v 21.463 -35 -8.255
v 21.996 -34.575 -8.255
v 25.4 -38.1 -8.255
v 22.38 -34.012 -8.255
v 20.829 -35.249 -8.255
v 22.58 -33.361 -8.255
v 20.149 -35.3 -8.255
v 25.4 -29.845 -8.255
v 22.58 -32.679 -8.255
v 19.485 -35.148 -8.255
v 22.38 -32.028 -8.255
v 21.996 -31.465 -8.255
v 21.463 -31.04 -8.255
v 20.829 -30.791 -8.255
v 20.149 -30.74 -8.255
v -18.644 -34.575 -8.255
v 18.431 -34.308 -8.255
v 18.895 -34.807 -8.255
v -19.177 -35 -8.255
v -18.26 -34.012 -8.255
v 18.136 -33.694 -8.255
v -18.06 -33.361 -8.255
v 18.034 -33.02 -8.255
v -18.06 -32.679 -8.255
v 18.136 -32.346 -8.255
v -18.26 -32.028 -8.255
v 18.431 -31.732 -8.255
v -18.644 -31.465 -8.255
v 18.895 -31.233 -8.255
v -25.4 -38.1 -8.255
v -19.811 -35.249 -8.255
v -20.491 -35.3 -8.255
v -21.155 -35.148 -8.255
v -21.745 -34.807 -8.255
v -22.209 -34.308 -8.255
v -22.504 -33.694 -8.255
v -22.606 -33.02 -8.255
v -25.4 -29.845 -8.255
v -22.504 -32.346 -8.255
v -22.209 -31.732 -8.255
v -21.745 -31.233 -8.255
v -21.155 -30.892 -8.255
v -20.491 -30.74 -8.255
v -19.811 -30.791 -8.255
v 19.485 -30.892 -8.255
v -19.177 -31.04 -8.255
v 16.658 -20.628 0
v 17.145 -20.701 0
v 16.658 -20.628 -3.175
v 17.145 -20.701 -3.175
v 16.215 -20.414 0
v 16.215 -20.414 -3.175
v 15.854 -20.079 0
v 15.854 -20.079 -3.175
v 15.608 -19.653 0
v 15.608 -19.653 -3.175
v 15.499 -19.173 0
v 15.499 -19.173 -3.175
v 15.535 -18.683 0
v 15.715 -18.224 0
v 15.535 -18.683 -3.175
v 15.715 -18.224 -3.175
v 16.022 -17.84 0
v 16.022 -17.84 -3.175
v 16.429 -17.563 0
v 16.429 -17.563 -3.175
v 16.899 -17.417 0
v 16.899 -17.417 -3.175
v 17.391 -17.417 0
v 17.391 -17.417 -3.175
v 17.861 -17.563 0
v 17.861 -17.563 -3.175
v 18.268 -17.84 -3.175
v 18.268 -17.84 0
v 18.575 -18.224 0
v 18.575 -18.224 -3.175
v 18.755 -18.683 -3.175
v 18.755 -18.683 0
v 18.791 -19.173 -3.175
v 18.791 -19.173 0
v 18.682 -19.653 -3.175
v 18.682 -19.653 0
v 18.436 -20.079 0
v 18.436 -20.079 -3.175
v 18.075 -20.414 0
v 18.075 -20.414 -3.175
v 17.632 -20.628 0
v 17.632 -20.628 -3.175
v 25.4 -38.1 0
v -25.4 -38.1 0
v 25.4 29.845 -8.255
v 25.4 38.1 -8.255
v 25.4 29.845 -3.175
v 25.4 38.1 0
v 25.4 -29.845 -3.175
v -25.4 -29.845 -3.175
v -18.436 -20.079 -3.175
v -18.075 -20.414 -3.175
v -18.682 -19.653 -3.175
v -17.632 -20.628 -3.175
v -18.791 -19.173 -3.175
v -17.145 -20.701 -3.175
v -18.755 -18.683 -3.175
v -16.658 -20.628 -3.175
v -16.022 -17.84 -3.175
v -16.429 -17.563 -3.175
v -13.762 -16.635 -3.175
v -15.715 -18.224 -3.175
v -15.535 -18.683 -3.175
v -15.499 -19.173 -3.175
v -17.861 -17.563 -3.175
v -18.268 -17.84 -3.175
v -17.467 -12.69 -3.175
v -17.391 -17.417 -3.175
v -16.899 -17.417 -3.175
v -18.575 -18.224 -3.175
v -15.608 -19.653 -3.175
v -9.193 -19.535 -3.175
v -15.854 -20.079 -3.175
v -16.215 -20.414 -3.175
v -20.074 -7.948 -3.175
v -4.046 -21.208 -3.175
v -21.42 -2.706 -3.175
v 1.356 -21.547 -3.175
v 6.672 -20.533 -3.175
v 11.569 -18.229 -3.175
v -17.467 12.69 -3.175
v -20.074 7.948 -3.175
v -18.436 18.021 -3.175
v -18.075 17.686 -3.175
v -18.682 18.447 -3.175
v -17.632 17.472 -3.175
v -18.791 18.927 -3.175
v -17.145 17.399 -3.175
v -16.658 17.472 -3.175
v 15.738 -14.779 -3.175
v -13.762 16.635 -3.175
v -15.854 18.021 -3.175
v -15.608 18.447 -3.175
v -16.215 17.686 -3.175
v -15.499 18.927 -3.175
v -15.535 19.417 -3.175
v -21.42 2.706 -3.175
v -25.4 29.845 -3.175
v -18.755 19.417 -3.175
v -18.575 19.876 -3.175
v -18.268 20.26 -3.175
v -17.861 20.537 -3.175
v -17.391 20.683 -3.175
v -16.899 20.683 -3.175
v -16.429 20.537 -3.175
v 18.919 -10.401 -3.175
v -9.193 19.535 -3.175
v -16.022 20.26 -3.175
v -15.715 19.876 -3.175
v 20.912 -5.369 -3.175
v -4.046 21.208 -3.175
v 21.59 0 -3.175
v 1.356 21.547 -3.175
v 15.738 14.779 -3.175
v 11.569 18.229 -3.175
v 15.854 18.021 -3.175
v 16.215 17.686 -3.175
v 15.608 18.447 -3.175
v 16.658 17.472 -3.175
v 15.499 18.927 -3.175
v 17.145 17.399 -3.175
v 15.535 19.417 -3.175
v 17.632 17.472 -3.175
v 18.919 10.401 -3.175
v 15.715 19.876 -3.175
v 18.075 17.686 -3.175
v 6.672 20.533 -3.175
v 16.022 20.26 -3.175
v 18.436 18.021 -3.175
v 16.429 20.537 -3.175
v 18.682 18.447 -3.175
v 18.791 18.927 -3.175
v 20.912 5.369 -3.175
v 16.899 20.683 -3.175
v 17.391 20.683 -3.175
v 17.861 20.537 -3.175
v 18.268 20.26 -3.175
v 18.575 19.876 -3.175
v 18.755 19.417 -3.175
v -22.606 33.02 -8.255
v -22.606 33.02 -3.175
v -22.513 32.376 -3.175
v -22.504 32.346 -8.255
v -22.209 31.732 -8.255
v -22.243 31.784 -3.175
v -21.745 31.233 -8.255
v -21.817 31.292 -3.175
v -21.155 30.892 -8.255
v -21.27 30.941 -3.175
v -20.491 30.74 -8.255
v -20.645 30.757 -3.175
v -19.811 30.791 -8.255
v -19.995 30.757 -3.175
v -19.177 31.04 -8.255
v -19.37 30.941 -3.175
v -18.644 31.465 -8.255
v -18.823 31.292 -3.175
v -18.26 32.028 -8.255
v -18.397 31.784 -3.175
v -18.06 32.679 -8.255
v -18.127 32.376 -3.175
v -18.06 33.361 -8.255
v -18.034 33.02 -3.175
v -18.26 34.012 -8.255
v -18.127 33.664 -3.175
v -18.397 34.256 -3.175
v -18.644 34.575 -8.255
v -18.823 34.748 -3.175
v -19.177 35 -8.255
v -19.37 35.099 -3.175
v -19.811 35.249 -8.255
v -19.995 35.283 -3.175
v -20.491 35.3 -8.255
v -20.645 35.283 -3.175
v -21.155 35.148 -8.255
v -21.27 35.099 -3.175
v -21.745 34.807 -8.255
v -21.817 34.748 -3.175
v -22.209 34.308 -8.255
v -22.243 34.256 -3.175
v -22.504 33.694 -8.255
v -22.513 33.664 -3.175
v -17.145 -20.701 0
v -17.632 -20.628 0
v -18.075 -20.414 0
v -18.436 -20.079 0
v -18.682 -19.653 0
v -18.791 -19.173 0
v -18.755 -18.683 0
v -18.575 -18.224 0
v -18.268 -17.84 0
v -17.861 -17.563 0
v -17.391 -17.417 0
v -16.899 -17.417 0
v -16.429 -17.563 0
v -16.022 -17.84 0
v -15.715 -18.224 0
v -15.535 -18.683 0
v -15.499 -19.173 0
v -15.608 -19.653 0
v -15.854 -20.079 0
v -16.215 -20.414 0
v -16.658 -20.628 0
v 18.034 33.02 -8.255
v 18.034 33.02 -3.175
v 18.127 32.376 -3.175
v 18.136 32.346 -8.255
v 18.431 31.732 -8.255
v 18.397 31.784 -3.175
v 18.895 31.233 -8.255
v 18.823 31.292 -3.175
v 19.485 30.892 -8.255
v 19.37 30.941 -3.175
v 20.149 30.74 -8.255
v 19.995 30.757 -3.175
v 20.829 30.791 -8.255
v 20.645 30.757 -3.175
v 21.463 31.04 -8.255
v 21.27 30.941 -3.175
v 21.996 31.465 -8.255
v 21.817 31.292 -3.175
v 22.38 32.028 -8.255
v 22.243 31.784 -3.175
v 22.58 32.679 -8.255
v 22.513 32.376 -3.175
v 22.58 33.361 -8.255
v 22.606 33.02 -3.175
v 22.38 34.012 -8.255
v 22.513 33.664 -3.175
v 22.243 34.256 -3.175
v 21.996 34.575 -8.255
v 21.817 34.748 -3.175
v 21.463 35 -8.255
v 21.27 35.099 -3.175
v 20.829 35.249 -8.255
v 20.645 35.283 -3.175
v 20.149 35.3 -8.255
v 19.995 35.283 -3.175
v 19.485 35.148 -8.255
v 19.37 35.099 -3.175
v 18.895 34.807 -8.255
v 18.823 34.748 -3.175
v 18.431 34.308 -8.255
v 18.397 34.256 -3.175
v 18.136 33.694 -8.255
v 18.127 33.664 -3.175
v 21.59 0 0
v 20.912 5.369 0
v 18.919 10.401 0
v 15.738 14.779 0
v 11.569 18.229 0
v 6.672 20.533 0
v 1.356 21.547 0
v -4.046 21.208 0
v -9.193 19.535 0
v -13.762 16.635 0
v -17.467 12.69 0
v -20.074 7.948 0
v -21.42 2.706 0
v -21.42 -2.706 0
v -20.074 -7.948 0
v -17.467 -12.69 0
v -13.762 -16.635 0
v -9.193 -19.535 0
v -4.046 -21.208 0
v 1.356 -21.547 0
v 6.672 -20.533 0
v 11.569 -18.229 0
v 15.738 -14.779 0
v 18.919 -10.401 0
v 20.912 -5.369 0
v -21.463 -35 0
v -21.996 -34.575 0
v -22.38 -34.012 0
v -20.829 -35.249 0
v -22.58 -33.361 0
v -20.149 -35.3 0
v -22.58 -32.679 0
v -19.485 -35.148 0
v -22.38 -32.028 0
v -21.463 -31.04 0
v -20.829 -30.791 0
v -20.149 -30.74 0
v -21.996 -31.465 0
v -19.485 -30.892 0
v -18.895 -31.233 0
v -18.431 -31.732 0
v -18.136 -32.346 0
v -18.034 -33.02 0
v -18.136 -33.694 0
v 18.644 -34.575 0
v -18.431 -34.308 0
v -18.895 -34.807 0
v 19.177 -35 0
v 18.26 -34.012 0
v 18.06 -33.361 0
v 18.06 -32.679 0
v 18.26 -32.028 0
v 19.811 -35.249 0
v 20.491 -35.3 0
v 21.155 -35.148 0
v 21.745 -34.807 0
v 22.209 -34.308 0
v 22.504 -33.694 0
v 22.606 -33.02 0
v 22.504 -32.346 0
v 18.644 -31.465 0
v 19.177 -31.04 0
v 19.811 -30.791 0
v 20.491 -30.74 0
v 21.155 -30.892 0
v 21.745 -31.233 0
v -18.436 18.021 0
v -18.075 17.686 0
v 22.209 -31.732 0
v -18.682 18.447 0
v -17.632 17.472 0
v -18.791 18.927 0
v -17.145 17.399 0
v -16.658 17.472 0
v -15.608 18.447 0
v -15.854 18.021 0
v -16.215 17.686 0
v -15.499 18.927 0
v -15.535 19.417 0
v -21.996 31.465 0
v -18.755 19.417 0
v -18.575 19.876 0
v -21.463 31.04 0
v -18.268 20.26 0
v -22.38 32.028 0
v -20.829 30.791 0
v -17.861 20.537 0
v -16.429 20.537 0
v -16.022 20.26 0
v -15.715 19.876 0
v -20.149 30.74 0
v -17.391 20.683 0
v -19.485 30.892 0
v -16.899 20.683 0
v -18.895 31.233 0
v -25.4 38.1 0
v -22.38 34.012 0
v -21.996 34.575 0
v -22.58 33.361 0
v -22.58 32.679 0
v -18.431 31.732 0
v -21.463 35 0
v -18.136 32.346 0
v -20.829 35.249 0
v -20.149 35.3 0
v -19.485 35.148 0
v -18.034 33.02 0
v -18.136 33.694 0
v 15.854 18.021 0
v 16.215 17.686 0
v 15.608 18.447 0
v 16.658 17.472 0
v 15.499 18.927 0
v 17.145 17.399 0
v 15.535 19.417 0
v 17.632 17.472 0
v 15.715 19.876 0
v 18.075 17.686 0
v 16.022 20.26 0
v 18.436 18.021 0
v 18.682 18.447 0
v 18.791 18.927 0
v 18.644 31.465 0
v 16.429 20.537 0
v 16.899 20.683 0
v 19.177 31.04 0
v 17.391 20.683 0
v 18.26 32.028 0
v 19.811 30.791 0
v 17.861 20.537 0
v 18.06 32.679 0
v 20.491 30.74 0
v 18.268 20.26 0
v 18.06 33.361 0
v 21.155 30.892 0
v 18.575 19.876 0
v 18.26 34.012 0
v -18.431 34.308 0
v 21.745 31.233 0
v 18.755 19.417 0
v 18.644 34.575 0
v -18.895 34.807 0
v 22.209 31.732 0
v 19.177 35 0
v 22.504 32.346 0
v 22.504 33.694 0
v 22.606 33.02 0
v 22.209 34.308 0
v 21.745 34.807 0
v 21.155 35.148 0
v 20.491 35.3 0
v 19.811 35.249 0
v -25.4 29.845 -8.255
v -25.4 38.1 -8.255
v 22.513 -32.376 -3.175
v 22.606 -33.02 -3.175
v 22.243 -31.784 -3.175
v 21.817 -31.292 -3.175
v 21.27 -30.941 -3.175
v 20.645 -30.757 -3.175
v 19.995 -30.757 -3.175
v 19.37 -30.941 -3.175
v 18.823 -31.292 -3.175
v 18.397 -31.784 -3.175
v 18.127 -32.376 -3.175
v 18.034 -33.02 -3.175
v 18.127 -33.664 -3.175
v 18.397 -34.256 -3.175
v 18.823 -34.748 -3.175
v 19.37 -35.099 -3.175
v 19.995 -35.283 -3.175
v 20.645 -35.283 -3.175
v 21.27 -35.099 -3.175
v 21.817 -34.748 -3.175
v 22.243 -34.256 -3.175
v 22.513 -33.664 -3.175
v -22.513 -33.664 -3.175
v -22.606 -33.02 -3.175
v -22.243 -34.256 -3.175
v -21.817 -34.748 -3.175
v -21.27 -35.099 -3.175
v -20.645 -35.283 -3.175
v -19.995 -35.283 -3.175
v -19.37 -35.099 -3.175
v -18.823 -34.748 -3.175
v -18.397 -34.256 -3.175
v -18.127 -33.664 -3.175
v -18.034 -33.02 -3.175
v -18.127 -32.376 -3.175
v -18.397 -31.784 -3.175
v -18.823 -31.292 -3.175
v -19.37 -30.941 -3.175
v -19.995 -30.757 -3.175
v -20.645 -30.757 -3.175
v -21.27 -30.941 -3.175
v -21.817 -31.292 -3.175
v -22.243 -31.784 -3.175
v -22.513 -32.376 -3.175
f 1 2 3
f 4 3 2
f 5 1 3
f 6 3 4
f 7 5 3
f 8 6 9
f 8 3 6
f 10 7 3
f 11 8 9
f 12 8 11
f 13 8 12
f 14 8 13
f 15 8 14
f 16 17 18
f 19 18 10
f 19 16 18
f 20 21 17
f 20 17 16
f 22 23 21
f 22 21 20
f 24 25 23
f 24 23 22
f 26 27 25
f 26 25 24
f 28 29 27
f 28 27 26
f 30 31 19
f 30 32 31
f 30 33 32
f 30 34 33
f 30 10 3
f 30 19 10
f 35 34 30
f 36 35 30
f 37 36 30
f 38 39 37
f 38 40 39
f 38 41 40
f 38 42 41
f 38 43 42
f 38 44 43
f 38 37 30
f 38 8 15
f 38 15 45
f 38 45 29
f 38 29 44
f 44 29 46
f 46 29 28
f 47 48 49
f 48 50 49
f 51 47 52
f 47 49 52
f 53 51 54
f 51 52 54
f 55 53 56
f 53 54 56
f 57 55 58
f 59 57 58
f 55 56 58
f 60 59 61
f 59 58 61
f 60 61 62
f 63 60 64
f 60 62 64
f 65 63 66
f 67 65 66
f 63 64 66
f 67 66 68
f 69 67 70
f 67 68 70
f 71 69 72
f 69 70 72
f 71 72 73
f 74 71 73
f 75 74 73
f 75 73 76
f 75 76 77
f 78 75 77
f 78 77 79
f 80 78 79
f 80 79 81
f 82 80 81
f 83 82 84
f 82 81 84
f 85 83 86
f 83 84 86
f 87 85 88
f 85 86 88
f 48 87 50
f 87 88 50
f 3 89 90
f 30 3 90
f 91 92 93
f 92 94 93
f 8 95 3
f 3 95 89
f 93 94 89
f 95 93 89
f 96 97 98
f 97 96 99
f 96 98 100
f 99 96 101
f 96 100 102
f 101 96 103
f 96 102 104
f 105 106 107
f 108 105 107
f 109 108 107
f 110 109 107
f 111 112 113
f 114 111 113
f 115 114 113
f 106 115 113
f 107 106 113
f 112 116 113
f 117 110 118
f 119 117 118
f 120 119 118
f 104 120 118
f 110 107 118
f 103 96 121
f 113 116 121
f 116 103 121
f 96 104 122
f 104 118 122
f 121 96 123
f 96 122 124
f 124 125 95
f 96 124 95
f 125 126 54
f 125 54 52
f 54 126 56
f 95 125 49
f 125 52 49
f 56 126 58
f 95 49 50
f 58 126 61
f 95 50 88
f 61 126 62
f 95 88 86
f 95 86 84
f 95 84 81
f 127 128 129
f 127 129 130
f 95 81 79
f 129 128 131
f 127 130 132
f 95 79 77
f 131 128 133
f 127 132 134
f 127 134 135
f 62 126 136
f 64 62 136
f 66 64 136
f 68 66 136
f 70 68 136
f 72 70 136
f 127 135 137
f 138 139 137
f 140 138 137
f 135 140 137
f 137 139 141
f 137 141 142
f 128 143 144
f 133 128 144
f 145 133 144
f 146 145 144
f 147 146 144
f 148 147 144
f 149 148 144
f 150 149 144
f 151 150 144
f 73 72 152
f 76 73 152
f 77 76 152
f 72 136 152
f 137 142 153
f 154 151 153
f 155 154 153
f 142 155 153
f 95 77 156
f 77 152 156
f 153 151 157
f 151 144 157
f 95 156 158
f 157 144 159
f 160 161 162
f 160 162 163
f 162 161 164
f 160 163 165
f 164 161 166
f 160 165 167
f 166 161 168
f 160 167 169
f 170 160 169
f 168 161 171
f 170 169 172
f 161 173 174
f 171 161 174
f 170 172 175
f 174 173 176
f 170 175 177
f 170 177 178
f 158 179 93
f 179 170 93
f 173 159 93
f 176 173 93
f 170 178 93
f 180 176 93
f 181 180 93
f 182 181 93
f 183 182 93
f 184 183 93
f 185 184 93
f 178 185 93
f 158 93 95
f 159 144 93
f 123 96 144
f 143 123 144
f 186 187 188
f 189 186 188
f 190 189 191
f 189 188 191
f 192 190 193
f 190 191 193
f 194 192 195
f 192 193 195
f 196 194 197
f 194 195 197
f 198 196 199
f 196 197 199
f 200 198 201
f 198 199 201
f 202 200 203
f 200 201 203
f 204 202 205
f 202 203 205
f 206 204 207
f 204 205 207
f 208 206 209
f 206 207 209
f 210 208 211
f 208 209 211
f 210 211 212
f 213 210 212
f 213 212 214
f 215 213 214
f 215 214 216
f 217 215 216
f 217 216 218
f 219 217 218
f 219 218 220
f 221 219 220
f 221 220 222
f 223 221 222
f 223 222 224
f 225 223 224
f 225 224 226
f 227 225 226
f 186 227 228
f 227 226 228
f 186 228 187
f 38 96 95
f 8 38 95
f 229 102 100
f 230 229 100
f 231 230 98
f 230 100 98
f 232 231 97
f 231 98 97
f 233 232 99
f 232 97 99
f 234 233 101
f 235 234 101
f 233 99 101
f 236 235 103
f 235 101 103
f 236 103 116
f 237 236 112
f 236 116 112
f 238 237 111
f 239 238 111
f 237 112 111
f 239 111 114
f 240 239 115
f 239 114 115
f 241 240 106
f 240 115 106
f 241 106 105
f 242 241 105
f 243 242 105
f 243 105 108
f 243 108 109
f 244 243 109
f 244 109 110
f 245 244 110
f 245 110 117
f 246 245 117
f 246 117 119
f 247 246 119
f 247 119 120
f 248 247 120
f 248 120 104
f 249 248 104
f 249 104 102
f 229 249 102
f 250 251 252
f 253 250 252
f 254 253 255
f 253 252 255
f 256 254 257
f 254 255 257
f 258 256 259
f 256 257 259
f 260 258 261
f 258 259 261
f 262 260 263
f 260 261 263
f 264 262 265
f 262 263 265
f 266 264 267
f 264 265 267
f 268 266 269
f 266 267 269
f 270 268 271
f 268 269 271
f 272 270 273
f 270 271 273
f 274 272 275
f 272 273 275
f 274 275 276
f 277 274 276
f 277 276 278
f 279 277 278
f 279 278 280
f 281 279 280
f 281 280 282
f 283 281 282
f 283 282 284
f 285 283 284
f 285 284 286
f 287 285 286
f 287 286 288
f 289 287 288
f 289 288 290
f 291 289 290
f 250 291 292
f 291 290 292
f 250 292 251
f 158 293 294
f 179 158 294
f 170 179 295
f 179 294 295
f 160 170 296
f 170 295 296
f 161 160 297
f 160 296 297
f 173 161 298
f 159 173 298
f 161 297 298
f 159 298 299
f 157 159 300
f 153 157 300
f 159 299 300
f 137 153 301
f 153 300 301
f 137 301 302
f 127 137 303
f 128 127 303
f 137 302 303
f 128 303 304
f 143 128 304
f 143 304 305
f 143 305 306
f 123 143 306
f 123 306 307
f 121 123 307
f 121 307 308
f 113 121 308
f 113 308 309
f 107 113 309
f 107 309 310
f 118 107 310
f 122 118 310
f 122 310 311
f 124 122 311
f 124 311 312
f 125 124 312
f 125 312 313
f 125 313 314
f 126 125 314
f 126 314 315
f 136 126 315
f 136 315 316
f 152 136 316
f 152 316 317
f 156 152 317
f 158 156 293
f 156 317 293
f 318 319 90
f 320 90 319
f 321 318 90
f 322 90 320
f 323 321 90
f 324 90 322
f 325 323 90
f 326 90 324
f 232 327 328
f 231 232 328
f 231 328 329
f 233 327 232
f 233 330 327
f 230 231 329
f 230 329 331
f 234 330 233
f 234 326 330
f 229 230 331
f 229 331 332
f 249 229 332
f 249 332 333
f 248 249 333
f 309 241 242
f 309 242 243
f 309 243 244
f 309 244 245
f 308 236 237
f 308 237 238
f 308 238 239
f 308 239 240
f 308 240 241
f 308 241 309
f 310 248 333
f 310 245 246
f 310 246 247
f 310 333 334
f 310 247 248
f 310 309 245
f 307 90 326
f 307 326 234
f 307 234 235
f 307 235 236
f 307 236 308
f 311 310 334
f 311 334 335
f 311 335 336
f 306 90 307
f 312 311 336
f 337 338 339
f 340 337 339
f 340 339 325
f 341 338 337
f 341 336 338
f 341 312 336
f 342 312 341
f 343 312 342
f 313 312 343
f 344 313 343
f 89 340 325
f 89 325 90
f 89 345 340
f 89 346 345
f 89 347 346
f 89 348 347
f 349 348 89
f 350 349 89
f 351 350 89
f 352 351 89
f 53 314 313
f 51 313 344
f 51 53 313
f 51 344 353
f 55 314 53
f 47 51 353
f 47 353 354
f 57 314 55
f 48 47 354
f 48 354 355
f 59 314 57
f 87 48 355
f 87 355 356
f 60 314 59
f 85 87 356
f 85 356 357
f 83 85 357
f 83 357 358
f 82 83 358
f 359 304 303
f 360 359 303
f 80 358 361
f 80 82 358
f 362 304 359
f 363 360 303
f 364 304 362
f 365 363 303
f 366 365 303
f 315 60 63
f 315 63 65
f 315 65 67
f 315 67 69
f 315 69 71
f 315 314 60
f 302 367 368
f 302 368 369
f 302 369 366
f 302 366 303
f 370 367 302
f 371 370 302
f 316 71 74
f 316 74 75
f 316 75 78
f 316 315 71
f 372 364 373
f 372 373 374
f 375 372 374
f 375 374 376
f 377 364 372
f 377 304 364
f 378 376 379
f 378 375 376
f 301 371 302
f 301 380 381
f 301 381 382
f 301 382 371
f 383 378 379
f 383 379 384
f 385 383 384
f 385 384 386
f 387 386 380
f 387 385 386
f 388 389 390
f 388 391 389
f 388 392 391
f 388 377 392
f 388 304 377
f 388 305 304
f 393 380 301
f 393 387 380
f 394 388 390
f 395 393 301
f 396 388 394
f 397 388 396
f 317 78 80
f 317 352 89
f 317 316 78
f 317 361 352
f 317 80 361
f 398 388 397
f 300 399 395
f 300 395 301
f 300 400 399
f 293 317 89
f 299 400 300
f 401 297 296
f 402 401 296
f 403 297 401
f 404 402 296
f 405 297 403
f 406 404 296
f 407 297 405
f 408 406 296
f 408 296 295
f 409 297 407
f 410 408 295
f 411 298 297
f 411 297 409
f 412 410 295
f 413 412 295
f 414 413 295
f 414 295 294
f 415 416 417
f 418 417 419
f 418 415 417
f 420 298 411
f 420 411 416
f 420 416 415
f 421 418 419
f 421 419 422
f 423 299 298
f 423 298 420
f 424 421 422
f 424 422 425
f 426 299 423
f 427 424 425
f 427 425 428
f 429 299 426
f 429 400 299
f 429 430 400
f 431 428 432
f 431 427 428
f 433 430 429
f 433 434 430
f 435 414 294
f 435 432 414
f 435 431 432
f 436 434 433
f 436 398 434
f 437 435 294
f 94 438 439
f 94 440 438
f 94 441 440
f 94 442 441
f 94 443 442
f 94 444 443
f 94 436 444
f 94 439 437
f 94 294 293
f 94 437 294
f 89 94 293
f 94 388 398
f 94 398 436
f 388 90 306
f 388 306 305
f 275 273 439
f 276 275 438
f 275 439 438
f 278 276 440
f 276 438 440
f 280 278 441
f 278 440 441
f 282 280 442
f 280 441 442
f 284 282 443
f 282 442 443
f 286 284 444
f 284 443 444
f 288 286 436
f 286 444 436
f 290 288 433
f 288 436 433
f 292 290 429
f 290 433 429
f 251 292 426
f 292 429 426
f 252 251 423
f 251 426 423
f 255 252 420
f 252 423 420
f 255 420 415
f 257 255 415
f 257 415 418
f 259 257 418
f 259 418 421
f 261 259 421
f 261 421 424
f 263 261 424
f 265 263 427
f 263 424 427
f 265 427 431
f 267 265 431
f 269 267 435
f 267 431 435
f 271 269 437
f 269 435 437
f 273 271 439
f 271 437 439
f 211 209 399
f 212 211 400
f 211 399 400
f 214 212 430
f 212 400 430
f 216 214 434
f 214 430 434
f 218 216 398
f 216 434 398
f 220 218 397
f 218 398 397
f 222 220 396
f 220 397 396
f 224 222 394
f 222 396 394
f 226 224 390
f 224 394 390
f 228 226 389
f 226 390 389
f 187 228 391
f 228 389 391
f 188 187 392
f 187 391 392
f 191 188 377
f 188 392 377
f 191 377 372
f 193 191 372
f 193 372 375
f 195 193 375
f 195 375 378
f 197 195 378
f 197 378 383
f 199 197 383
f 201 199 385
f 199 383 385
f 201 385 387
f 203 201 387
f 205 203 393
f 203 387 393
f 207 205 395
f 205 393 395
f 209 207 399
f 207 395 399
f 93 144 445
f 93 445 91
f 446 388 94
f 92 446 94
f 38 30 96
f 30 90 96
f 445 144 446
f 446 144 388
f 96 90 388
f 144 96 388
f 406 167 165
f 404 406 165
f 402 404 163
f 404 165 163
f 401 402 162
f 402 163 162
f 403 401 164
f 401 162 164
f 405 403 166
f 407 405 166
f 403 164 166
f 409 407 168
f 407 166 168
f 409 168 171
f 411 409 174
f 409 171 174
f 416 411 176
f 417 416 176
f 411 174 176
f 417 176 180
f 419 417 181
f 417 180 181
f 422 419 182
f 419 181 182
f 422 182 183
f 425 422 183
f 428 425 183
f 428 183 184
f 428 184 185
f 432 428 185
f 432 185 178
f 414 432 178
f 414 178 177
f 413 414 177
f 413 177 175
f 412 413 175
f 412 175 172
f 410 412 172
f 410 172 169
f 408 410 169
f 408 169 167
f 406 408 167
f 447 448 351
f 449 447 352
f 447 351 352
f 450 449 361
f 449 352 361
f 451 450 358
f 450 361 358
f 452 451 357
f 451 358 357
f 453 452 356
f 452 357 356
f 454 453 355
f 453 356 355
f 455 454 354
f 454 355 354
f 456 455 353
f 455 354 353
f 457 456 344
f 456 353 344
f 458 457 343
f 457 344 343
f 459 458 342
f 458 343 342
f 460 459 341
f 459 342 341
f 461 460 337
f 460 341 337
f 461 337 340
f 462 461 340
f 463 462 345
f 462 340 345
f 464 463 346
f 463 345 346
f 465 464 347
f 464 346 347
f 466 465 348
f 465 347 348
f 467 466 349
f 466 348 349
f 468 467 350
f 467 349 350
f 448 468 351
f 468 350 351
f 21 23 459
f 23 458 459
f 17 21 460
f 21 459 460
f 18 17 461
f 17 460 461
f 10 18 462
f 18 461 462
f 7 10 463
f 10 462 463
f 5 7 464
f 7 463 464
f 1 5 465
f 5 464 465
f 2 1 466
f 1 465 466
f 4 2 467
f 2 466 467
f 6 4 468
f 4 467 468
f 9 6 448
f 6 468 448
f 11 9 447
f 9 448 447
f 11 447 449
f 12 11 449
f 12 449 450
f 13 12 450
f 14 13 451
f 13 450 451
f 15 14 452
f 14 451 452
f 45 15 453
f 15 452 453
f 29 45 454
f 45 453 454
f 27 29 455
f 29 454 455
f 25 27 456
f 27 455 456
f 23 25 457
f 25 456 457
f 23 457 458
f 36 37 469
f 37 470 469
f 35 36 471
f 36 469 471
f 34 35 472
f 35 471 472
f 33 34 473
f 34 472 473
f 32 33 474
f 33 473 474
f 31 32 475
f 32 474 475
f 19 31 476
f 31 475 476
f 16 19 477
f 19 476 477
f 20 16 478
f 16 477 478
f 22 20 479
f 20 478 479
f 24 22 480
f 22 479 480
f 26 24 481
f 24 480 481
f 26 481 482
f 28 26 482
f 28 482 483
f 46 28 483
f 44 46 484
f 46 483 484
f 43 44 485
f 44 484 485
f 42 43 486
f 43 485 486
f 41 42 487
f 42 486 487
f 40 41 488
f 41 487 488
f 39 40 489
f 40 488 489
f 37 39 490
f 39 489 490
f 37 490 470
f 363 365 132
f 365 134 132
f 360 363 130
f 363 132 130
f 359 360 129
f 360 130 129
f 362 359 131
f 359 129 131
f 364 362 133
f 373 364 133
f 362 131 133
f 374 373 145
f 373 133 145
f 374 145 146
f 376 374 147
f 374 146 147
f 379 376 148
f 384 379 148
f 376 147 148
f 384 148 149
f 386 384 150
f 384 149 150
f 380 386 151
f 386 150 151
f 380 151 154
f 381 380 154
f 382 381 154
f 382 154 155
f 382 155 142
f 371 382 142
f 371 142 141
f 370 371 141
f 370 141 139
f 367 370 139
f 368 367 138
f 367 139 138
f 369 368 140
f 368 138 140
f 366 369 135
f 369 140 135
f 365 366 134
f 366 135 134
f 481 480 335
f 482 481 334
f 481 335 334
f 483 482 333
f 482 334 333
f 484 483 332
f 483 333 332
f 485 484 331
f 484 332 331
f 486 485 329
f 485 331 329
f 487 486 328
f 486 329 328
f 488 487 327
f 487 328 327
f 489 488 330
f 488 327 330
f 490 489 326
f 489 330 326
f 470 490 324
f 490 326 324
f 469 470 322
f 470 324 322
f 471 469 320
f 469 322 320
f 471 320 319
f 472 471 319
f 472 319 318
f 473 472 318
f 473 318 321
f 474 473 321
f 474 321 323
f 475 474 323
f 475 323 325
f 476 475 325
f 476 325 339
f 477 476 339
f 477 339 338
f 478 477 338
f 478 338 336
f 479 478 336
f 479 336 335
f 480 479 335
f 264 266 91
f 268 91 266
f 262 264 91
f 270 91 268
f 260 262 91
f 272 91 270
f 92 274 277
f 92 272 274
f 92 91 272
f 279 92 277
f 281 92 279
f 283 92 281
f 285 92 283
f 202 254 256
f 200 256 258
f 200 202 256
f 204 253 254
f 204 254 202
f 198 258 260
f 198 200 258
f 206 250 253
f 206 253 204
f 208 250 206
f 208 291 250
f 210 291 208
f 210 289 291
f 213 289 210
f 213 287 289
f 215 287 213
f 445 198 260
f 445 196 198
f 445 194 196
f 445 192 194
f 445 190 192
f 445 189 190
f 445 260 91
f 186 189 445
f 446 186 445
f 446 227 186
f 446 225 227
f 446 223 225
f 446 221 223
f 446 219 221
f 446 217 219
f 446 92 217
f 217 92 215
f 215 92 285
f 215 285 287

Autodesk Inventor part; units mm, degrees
ref_plane "YZ Plane" through (0, 0, 0) normal (1, 0, 0) x (0, 1, 0)
ref_plane "XZ Plane" through (0, 0, 0) normal (0, 1, 0) x (-1, 0, 0)
ref_plane "XY Plane" through (0, 0, 0) normal (0, 0, 1) x (1, 0, 0)
sketch "Sketch1" plane through (0, 0, 0) normal (0, 0, 1) x (1, 0, 0)
  line L0 (-25.4, 38.1) -> (25.4, 38.1)
  line L1 (25.4, 38.1) -> (25.4, -38.1)
  line L2 (25.4, -38.1) -> (-25.4, -38.1)
  line L3 (-25.4, -38.1) -> (-25.4, 38.1)
  circle A0 centre (0, 0) radius 21.59
  circle A1 centre (-20.32, 33.02) radius 2.286
  circle A2 centre (0, 0) radius 19.05 construction
  circle A3 centre (20.32, 33.02) radius 2.286
  circle A4 centre (-20.32, -33.02) radius 2.286
  circle A5 centre (20.32, -33.02) radius 2.286
  point P0 (-17.145, 19.05)
  point P1 (17.145, 19.05)
  point P2 (17.145, -19.05)
  point P3 (-17.145, -19.05)
  dimension "d0" = 43.18
  dimension "d1" = 76.2
  dimension "d2" = 38.1
  dimension "d3" = 50.8
  dimension "d4" = 25.4
  dimension "d5" = 4.572
  dimension "d6" = 5.08
  dimension "d7" = 5.08
  dimension "d8" = 38.1
  dimension "d9" = 4.572
  dimension "d10" = 5.08
  dimension "d11" = 5.08
  dimension "d12" = 4.572
  dimension "d13" = 4.572
  dimension "d20" = 66.04
  dimension "d21" = 40.64
  dimension "d23" = 34.29
  dimension "d24" = 19.05
  dimension "d25" = 19.05
  dimension "d26" = 17.145
extrude "Extrusion1" add sketch "Sketch1" against normal blind 3.175
sketch "Sketch2" plane through (0, 0, -3.175) normal (0, 0, -1) x (-1, 0, 0)
  circle A0 centre (-20.32, -33.02) radius 2.286 projected
  circle A1 centre (20.32, -33.02) radius 2.286 projected
  circle A2 centre (-20.32, 33.02) radius 2.286 projected
  circle A3 centre (20.32, 33.02) radius 2.286 projected
  line L0 (25.4, 38.1) -> (25.4, -38.1) projected
  line L1 (-25.4, 38.1) -> (25.4, 38.1) projected
  line L2 (-25.4, -38.1) -> (-25.4, 38.1) projected
  line L3 (25.4, -38.1) -> (-25.4, -38.1) projected
  line L4 (-25.4, 38.1) -> (25.4, 38.1)
  line L5 (25.4, 38.1) -> (25.4, 29.845)
  line L6 (25.4, 29.845) -> (-25.4, 29.845)
  line L7 (-25.4, 29.845) -> (-25.4, 38.1)
  line L8 (-25.4, -38.1) -> (25.4, -38.1)
  line L9 (25.4, -38.1) -> (25.4, -29.845)
  line L10 (25.4, -29.845) -> (-25.4, -29.845)
  line L11 (-25.4, -29.845) -> (-25.4, -38.1)
  dimension "d16" = 8.255
  dimension "d17" = 8.255
extrude "Extrusion2" add sketch "Sketch2" along normal blind 5.08 contours L0 L6 L2 L1 | L0 L3 L2 L10
hole "Hole1" at (-17.145, 19.05, 0) at (17.145, 19.05, 0) at (17.145, -19.05, 0) at (-17.145, -19.05, 0) direction (0, 0, -1) diameter 3.302 end through all thread size "8-32 UNC" class "2B" standard "ANSI Unified Screw Threads"
equation "\"d2\" = 0.5 * d1"
equation "\"d4\" = 0.5 * d3"
equation "\"d9\" = d5"
equation "\"d12\" = d5"
equation "\"d13\" = d5"
equation "\"d26\" = 0.5 * d23"
equation "\"d17\" = d16"
properties part number "Dewalt CAP Clamp Plate"
